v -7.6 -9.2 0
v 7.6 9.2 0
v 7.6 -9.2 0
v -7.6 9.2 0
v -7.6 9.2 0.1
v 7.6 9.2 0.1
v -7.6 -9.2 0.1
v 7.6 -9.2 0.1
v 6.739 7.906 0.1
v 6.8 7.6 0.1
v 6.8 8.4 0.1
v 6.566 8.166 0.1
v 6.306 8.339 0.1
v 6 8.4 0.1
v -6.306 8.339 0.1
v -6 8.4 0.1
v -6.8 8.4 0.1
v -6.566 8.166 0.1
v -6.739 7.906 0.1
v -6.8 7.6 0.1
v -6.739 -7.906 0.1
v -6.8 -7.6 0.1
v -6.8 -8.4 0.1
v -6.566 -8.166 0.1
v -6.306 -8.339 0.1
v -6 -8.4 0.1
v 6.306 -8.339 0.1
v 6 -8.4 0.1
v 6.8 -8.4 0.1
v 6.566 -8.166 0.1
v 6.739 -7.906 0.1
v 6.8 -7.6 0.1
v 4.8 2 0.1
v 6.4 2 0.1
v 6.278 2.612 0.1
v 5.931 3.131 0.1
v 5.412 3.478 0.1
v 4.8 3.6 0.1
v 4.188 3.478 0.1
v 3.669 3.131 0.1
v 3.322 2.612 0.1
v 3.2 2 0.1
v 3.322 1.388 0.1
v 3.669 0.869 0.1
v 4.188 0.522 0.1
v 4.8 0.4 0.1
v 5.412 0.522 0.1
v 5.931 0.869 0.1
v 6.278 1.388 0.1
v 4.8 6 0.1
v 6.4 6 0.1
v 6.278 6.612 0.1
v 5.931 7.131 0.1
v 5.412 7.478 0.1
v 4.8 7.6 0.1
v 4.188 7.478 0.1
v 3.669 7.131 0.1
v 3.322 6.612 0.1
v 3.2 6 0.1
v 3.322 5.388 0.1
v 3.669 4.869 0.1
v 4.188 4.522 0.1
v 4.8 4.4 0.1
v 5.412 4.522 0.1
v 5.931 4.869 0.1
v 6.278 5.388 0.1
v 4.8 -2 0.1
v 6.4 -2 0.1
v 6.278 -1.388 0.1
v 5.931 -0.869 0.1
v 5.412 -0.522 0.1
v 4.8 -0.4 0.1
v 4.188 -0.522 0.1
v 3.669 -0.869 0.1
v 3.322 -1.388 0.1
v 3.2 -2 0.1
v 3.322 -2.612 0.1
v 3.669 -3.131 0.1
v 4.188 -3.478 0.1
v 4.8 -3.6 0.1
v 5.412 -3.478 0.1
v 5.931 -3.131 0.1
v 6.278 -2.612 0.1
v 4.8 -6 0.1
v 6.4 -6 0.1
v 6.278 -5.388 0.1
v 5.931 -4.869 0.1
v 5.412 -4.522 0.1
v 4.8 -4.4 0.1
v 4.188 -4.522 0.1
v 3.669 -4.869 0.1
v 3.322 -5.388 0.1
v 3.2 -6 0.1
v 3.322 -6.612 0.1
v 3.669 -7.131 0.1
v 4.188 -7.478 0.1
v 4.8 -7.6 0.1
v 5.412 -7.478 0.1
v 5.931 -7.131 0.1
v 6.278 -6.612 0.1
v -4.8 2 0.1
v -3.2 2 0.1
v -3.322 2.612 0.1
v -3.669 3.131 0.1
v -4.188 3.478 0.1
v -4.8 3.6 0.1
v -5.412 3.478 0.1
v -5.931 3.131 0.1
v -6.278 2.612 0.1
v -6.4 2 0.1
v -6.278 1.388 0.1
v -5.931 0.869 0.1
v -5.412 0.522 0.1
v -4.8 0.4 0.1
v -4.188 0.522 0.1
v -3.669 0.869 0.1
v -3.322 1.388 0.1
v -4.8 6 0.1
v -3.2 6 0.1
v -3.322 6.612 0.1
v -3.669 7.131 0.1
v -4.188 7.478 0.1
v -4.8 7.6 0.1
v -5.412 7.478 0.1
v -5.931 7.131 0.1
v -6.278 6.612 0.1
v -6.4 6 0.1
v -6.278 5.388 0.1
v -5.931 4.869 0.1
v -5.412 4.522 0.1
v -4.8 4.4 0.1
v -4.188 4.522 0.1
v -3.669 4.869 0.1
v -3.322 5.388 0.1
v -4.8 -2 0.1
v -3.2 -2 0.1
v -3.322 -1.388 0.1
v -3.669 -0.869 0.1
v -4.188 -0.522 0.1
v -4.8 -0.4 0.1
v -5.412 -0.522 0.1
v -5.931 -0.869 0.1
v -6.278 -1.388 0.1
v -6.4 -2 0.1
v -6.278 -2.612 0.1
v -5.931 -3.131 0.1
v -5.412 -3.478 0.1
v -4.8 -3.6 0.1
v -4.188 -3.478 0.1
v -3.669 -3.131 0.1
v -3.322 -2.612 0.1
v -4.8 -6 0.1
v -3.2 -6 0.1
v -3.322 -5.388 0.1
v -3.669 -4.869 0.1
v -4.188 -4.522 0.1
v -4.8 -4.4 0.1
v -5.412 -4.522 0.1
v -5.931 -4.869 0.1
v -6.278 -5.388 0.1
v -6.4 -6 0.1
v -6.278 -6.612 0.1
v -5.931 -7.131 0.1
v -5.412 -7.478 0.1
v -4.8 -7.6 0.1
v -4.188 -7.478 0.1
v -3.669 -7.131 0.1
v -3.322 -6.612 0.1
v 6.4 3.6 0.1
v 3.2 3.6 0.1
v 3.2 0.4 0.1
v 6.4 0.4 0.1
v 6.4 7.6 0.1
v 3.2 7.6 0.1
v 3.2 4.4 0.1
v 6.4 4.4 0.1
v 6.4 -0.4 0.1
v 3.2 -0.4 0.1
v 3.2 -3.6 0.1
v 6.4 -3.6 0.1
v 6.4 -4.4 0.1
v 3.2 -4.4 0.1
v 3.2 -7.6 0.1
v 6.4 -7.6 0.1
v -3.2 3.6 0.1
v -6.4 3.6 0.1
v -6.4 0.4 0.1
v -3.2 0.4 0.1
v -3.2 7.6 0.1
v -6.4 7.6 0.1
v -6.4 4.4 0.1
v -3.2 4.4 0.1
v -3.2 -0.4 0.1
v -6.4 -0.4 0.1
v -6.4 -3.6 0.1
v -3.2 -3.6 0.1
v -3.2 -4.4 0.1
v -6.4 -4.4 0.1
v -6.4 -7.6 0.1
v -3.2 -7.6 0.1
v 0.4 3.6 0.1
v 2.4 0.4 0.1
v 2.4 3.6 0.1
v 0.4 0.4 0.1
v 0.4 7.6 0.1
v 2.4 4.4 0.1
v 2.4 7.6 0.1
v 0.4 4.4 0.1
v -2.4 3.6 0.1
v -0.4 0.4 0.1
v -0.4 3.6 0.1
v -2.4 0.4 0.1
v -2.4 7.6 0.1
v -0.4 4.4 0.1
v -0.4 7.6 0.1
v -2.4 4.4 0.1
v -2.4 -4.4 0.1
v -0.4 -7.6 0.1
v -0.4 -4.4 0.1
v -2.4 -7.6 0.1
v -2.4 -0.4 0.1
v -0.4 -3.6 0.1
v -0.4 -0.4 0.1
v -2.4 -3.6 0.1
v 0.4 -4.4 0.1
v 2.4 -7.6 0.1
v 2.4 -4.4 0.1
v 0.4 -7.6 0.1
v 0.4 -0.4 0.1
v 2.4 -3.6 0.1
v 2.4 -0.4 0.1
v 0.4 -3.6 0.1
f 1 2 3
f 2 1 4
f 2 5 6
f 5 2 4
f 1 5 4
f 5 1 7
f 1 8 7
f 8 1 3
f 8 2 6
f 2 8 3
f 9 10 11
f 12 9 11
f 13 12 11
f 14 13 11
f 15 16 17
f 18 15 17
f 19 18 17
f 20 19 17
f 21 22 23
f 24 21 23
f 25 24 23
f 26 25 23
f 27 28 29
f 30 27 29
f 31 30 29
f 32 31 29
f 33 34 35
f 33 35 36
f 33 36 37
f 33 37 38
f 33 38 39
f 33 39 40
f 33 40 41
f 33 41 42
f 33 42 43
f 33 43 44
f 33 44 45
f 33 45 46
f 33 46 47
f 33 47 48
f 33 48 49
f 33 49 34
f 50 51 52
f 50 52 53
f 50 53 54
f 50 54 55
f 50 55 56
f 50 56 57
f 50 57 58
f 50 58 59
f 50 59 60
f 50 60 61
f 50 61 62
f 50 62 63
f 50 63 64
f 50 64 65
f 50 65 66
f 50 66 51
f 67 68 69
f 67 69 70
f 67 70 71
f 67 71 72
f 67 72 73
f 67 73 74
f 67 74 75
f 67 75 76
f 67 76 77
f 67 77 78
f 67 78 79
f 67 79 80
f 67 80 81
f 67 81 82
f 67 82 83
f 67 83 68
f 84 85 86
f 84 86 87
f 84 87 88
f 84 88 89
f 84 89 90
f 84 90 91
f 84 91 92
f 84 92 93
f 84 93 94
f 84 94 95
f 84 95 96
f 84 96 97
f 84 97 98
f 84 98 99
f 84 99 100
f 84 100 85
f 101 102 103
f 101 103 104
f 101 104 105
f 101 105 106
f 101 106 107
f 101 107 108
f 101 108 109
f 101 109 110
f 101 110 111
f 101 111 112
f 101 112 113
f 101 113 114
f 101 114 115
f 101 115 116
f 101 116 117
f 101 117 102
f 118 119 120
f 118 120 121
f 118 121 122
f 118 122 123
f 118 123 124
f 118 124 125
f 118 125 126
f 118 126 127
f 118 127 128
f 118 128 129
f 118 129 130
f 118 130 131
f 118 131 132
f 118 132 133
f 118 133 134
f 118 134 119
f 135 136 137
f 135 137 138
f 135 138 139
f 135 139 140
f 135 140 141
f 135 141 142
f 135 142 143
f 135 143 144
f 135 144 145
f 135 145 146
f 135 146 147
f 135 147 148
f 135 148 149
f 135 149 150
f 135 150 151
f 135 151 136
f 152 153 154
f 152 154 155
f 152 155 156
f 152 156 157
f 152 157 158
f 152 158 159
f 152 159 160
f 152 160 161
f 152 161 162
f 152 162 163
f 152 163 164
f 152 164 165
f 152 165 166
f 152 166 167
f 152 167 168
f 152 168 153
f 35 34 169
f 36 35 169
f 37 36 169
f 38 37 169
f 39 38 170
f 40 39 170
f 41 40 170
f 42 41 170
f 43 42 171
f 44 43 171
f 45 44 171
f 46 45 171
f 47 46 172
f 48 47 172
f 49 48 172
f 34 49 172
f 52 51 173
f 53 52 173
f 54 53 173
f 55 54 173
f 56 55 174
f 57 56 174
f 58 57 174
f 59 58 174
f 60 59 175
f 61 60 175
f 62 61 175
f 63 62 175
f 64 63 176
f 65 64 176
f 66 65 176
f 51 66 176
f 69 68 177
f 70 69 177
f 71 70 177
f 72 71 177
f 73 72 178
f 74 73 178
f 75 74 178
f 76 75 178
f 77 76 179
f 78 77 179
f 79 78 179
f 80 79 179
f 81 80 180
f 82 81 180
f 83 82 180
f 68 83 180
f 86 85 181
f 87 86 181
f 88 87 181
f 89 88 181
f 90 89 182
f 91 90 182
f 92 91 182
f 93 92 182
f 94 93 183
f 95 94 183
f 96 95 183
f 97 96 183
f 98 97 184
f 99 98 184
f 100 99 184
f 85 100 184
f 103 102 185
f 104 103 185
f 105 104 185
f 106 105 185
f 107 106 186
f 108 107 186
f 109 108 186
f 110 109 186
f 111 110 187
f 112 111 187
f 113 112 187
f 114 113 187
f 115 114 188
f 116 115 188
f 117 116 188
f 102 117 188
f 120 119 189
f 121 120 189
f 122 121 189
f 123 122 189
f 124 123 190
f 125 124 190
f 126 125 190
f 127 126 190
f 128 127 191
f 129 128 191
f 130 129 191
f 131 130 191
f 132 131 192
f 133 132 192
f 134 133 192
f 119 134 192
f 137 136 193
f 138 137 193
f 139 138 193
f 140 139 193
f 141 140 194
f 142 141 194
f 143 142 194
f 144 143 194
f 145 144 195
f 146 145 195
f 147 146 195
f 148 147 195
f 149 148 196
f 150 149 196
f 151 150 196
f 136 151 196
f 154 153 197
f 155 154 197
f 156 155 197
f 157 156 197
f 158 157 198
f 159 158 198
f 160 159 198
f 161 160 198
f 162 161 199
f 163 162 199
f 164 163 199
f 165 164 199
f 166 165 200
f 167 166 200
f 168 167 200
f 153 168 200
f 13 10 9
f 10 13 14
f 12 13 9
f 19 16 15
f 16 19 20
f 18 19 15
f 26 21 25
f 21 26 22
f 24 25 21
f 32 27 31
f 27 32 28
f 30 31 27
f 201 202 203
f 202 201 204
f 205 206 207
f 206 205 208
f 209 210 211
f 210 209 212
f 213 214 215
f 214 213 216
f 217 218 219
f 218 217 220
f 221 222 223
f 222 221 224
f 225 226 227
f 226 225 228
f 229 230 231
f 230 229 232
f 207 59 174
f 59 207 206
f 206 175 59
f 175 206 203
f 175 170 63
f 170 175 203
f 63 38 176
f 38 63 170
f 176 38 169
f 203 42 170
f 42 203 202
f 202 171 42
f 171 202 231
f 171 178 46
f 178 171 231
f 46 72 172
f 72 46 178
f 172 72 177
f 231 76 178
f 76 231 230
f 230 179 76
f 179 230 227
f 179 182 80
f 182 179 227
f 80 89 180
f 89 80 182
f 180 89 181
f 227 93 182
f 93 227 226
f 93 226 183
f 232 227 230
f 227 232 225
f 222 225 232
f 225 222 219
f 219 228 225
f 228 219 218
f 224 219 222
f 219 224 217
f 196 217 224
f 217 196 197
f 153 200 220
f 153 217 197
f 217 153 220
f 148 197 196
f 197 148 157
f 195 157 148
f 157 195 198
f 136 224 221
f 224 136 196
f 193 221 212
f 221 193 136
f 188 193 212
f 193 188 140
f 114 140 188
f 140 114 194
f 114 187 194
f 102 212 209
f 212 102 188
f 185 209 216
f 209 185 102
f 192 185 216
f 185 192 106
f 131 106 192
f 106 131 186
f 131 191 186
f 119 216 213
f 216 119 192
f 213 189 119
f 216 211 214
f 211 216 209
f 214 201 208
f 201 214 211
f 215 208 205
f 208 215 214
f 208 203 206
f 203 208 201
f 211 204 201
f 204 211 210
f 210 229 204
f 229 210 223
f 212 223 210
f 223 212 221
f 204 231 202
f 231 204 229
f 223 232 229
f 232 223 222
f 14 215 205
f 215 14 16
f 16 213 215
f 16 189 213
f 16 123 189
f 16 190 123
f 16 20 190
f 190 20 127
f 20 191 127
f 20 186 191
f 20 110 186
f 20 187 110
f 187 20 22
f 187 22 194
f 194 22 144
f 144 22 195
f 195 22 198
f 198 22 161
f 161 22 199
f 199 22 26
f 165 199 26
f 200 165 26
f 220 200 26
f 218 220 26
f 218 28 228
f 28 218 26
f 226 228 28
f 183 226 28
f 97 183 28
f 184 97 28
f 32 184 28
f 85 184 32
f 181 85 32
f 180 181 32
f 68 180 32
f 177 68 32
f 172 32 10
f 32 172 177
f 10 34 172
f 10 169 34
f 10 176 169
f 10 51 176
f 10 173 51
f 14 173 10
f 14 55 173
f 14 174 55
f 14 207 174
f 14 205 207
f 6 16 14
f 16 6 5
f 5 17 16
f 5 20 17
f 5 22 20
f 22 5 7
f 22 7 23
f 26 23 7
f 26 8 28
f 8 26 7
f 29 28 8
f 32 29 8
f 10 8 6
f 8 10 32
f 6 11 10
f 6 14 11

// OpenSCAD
// file: ../p/box5-12.scad
use <../lib.scad>
function ldraw_lib__box5_12() = [
// 0 Box with 5 Faces without Any Edges
// 0 Name: box5-12.dat
// 0 Author: Chris Dee [cwdee]
// 0 !LDRAW_ORG Primitive UPDATE 2009-02
// 0 !LICENSE Licensed under CC BY 4.0 : see CAreadme.txt
// 
// 0 BFC CERTIFY CCW
  [0,"BFC","CERTIFY"],
  [0,"BFC","CCW"],
// 
// 0 !HISTORY 2009-09-03 [PTadmin] Official Update 2009-02
// 
// 
// 4 16 1 1 1 1 1 -1 -1 1 -1 -1 1 1
  [4,16,1,1,1,1,1,-1,-1,1,-1,-1,1,1],
// 4 16 -1 0 1 1 0 1 1 1 1 -1 1 1
  [4,16,-1,0,1,1,0,1,1,1,1,-1,1,1],
// 4 16 -1 0 -1 -1 0 1 -1 1 1 -1 1 -1
  [4,16,-1,0,-1,-1,0,1,-1,1,1,-1,1,-1],
// 4 16 1 0 -1 -1 0 -1 -1 1 -1 1 1 -1
  [4,16,1,0,-1,-1,0,-1,-1,1,-1,1,1,-1],
// 4 16 1 0 1 1 0 -1 1 1 -1 1 1 1
  [4,16,1,0,1,1,0,-1,1,1,-1,1,1,1],
// 0
];
module ldraw_lib__box5_12(step=0, col=false, unit=2/5, alt=false, line=0.2, solid=!$preview)
    makepoly(ldraw_lib__box5_12(), step=step, col=col, unit=unit, alt=alt, line=line, solid=solid);
ldraw_lib__box5_12(line=0.2);
// file: ../p/4-4ndis.scad
use <../lib.scad>
function ldraw_lib__4_4ndis() = [
// 0 Disc Negative 1.0
// 0 Name: 4-4ndis.dat
// 0 Author: James Jessiman
// 0 !LDRAW_ORG Primitive UPDATE 2012-01
// 0 !LICENSE Licensed under CC BY 4.0 : see CAreadme.txt
// 
// 0 BFC CERTIFY CCW
  [0,"BFC","CERTIFY"],
  [0,"BFC","CCW"],
// 
// 0 !HISTORY 2002-03-23 [sbliss] Added BFC statement; compacted code
// 0 !HISTORY 2002-04-25 [PTadmin] Official Update 2002-02
// 0 !HISTORY 2007-06-24 [PTadmin] Header formatted for Contributor Agreement
// 0 !HISTORY 2008-07-01 [PTadmin] Official Update 2008-01
// 0 !HISTORY 2012-02-16 [Philo] Changed to CCW
// 0 !HISTORY 2012-03-30 [PTadmin] Official Update 2012-01
// 
// 
// 3 16 0.9239 0 0.3827 1 0 0 1 0 1
  [3,16,0.9239,0,0.3827,1,0,0,1,0,1],
// 3 16 0.7071 0 0.7071 0.9239 0 0.3827 1 0 1
  [3,16,0.7071,0,0.7071,0.9239,0,0.3827,1,0,1],
// 3 16 0.3827 0 0.9239 0.7071 0 0.7071 1 0 1
  [3,16,0.3827,0,0.9239,0.7071,0,0.7071,1,0,1],
// 3 16 0 0 1 0.3827 0 0.9239 1 0 1
  [3,16,0,0,1,0.3827,0,0.9239,1,0,1],
// 3 16 -0.3827 0 0.9239 0 0 1 -1 0 1
  [3,16,-0.3827,0,0.9239,0,0,1,-1,0,1],
// 3 16 -0.7071 0 0.7071 -0.3827 0 0.9239 -1 0 1
  [3,16,-0.7071,0,0.7071,-0.3827,0,0.9239,-1,0,1],
// 3 16 -0.9239 0 0.3827 -0.7071 0 0.7071 -1 0 1
  [3,16,-0.9239,0,0.3827,-0.7071,0,0.7071,-1,0,1],
// 3 16 -1 0 0 -0.9239 0 0.3827 -1 0 1
  [3,16,-1,0,0,-0.9239,0,0.3827,-1,0,1],
// 3 16 -0.9239 0 -0.3827 -1 0 0 -1 0 -1
  [3,16,-0.9239,0,-0.3827,-1,0,0,-1,0,-1],
// 3 16 -0.7071 0 -0.7071 -0.9239 0 -0.3827 -1 0 -1
  [3,16,-0.7071,0,-0.7071,-0.9239,0,-0.3827,-1,0,-1],
// 3 16 -0.3827 0 -0.9239 -0.7071 0 -0.7071 -1 0 -1
  [3,16,-0.3827,0,-0.9239,-0.7071,0,-0.7071,-1,0,-1],
// 3 16 0 0 -1 -0.3827 0 -0.9239 -1 0 -1
  [3,16,0,0,-1,-0.3827,0,-0.9239,-1,0,-1],
// 3 16 0.3827 0 -0.9239 0 0 -1 1 0 -1
  [3,16,0.3827,0,-0.9239,0,0,-1,1,0,-1],
// 3 16 0.7071 0 -0.7071 0.3827 0 -0.9239 1 0 -1
  [3,16,0.7071,0,-0.7071,0.3827,0,-0.9239,1,0,-1],
// 3 16 0.9239 0 -0.3827 0.7071 0 -0.7071 1 0 -1
  [3,16,0.9239,0,-0.3827,0.7071,0,-0.7071,1,0,-1],
// 3 16 1 0 0 0.9239 0 -0.3827 1 0 -1
  [3,16,1,0,0,0.9239,0,-0.3827,1,0,-1],
];
module ldraw_lib__4_4ndis(step=0, col=false, unit=2/5, alt=false, line=0.2, solid=!$preview)
    makepoly(ldraw_lib__4_4ndis(), step=step, col=col, unit=unit, alt=alt, line=line, solid=solid);
ldraw_lib__4_4ndis(line=0.2);
// file: ../p/4-4disc.scad
use <../lib.scad>
function ldraw_lib__4_4disc() = [
// 0 Disc 1.0
// 0 Name: 4-4disc.dat
// 0 Author: James Jessiman
// 0 !LDRAW_ORG Primitive UPDATE 2002-02
// 0 !LICENSE Licensed under CC BY 4.0 : see CAreadme.txt
// 
// 0 BFC CERTIFY CCW
  [0,"BFC","CERTIFY"],
  [0,"BFC","CCW"],
// 
// 0 !HISTORY 1998-12-15 [PTadmin] Official Update 1998-10
// 0 !HISTORY 2002-03-23 [sbliss] Added BFC statement
// 0 !HISTORY 2002-04-25 [PTadmin] Official Update 2002-02
// 0 !HISTORY 2007-06-24 [PTadmin] Header formatted for Contributor Agreement
// 0 !HISTORY 2008-07-01 [PTadmin] Official Update 2008-01
// 
// 
// 3 16 0 0 0 1 0 0 0.9239 0 0.3827
  [3,16,0,0,0,1,0,0,0.9239,0,0.3827],
// 3 16 0 0 0 0.9239 0 0.3827 0.7071 0 0.7071
  [3,16,0,0,0,0.9239,0,0.3827,0.7071,0,0.7071],
// 3 16 0 0 0 0.7071 0 0.7071 0.3827 0 0.9239
  [3,16,0,0,0,0.7071,0,0.7071,0.3827,0,0.9239],
// 3 16 0 0 0 0.3827 0 0.9239 0 0 1
  [3,16,0,0,0,0.3827,0,0.9239,0,0,1],
// 3 16 0 0 0 0 0 1 -0.3827 0 0.9239
  [3,16,0,0,0,0,0,1,-0.3827,0,0.9239],
// 3 16 0 0 0 -0.3827 0 0.9239 -0.7071 0 0.7071
  [3,16,0,0,0,-0.3827,0,0.9239,-0.7071,0,0.7071],
// 3 16 0 0 0 -0.7071 0 0.7071 -0.9239 0 0.3827
  [3,16,0,0,0,-0.7071,0,0.7071,-0.9239,0,0.3827],
// 3 16 0 0 0 -0.9239 0 0.3827 -1 0 -0
  [3,16,0,0,0,-0.9239,0,0.3827,-1,0,-0],
// 3 16 0 0 0 -1 0 -0 -0.9239 0 -0.3827
  [3,16,0,0,0,-1,0,-0,-0.9239,0,-0.3827],
// 3 16 0 0 0 -0.9239 0 -0.3827 -0.7071 0 -0.7071
  [3,16,0,0,0,-0.9239,0,-0.3827,-0.7071,0,-0.7071],
// 3 16 0 0 0 -0.7071 0 -0.7071 -0.3827 0 -0.9239
  [3,16,0,0,0,-0.7071,0,-0.7071,-0.3827,0,-0.9239],
// 3 16 0 0 0 -0.3827 0 -0.9239 0 0 -1
  [3,16,0,0,0,-0.3827,0,-0.9239,0,0,-1],
// 3 16 0 0 0 0 0 -1 0.3827 0 -0.9239
  [3,16,0,0,0,0,0,-1,0.3827,0,-0.9239],
// 3 16 0 0 0 0.3827 0 -0.9239 0.7071 0 -0.7071
  [3,16,0,0,0,0.3827,0,-0.9239,0.7071,0,-0.7071],
// 3 16 0 0 0 0.7071 0 -0.7071 0.9239 0 -0.3827
  [3,16,0,0,0,0.7071,0,-0.7071,0.9239,0,-0.3827],
// 3 16 0 0 0 0.9239 0 -0.3827 1 0 0
  [3,16,0,0,0,0.9239,0,-0.3827,1,0,0],
// 0
];
module ldraw_lib__4_4disc(step=0, col=false, unit=2/5, alt=false, line=0.2, solid=!$preview)
    makepoly(ldraw_lib__4_4disc(), step=step, col=col, unit=unit, alt=alt, line=line, solid=solid);
ldraw_lib__4_4disc(line=0.2);
// file: ../p/1-4ndis.scad
use <../lib.scad>
function ldraw_lib__1_4ndis() = [
// 0 Disc Negative 0.25
// 0 Name: 1-4ndis.dat
// 0 Author: James Jessiman
// 0 !LDRAW_ORG Primitive UPDATE 2012-01
// 0 !LICENSE Licensed under CC BY 4.0 : see CAreadme.txt
// 
// 0 BFC CERTIFY CCW
  [0,"BFC","CERTIFY"],
  [0,"BFC","CCW"],
// 
// 0 !HISTORY 2002-03-23 [sbliss] Added BFC Statement
// 0 !HISTORY 2002-04-25 [PTadmin] Official Update 2002-02
// 0 !HISTORY 2007-06-22 [PTadmin] Header formatted for Contributor Agreement
// 0 !HISTORY 2008-07-01 [PTadmin] Official Update 2008-01
// 0 !HISTORY 2012-02-16 [Philo] Changed to CCW
// 0 !HISTORY 2012-03-30 [PTadmin] Official Update 2012-01
// 
// 
// 3 16 0.9239 0 0.3827 1 0 0 1 0 1
  [3,16,0.9239,0,0.3827,1,0,0,1,0,1],
// 3 16 0.7071 0 0.7071 0.9239 0 0.3827 1 0 1
  [3,16,0.7071,0,0.7071,0.9239,0,0.3827,1,0,1],
// 3 16 0.3827 0 0.9239 0.7071 0 0.7071 1 0 1
  [3,16,0.3827,0,0.9239,0.7071,0,0.7071,1,0,1],
// 3 16 0 0 1 0.3827 0 0.9239 1 0 1
  [3,16,0,0,1,0.3827,0,0.9239,1,0,1],
];
module ldraw_lib__1_4ndis(step=0, col=false, unit=2/5, alt=false, line=0.2, solid=!$preview)
    makepoly(ldraw_lib__1_4ndis(), step=step, col=col, unit=unit, alt=alt, line=line, solid=solid);
ldraw_lib__1_4ndis(line=0.2);
// file: ../p/1-4chrd.scad
use <../lib.scad>
function ldraw_lib__1_4chrd() = [
// 0 Chord 0.25
// 0 Name: 1-4chrd.dat
// 0 Author: Max Martin Richter [MMR1988]
// 0 !LDRAW_ORG Primitive UPDATE 2023-05
// 0 !LICENSE Licensed under CC BY 4.0 : see CAreadme.txt
// 
// 0 BFC CERTIFY CCW
  [0,"BFC","CERTIFY"],
  [0,"BFC","CCW"],
// 
// 0 !HISTORY 2004-04-22 [PTadmin] Official Update 2004-02
// 0 !HISTORY 2007-10-09 [PTadmin] Header formatted for Contributor Agreement
// 0 !HISTORY 2008-07-01 [PTadmin] Official Update 2008-01
// 0 !HISTORY 2012-08-02 [MMR1988] Re-creation with PrimGen2 and Rectifier
// 0 !HISTORY 2012-08-09 [PTadmin] Official Update 2012-02
// 0 !HISTORY 2023-10-27 [OrionP] Change author to MMR1988 from hafhead
// 0 !HISTORY 2023-10-31 [OrionP] Official Update 2023-05
// 
// 4 16 0.9239 0 0.3827 0.3827 0 0.9239 0 0 1 1 0 0
  [4,16,0.9239,0,0.3827,0.3827,0,0.9239,0,0,1,1,0,0],
// 3 16 0.7071 0 0.7071 0.3827 0 0.9239 0.9239 0 0.3827
  [3,16,0.7071,0,0.7071,0.3827,0,0.9239,0.9239,0,0.3827],
];
module ldraw_lib__1_4chrd(step=0, col=false, unit=2/5, alt=false, line=0.2, solid=!$preview)
    makepoly(ldraw_lib__1_4chrd(), step=step, col=col, unit=unit, alt=alt, line=line, solid=solid);
ldraw_lib__1_4chrd(line=0.2);
// main file
use <../lib.scad>
use <../p/1-4chrd.scad>
use <../p/1-4ndis.scad>
use <../p/4-4disc.scad>
use <../p/4-4ndis.scad>
use <../p/box5-12.scad>
function ldraw_lib__196695b() = [
// 0 Sticker  2.3 x  1.9 with Four Red Circles, Eight White Rectangles and Four Yellow Circles
// 0 Name: 196695b.dat
// 0 Author: Takeshi Takahashi [RainbowDolphin]
// 0 !LDRAW_ORG Part UPDATE 2024-01
// 0 !LICENSE Licensed under CC BY 4.0 : see CAreadme.txt
// 
// 0 BFC CERTIFY CCW
  [0,"BFC","CERTIFY"],
  [0,"BFC","CCW"],
// 
// 0 !KEYWORDS Bricklink 6385stk01, Brickowl 514321, control panel, Fire engine
// 0 !KEYWORDS Fire Station, Rebrickable 196695, Set 6385
// 
// 0 !HISTORY 2024-01-29 [OrionP] Official Update 2024-01
// 
// 
// 1 16 0 -0.25 0 19 0 0 0 0.25 0 0 0 23 box5-12.dat
  [1,16,0,-0.25,0,19,0,0,0,0.25,0,0,0,23, ldraw_lib__box5_12()],
// 1 16 15 -0.25 19 2 0 0 0 1 0 0 0 2 1-4ndis.dat
  [1,16,15,-0.25,19,2,0,0,0,1,0,0,0,2, ldraw_lib__1_4ndis()],
// 1 16 -15 -0.25 19 0 0 -2 0 1 0 2 0 0 1-4ndis.dat
  [1,16,-15,-0.25,19,0,0,-2,0,1,0,2,0,0, ldraw_lib__1_4ndis()],
// 1 16 -15 -0.25 -19 -2 0 0 0 1 0 0 0 -2 1-4ndis.dat
  [1,16,-15,-0.25,-19,-2,0,0,0,1,0,0,0,-2, ldraw_lib__1_4ndis()],
// 1 16 15 -0.25 -19 0 0 2 0 1 0 -2 0 0 1-4ndis.dat
  [1,16,15,-0.25,-19,0,0,2,0,1,0,-2,0,0, ldraw_lib__1_4ndis()],
// 0 BFC NOCLIP
  [0,"BFC","NOCLIP"],
// 1 4 12 -0.25 5 4 0 0 0 1 0 0 0 4 4-4disc.dat
  [1,4,12,-0.25,5,4,0,0,0,1,0,0,0,4, ldraw_lib__4_4disc()],
// 1 4 12 -0.25 15 4 0 0 0 1 0 0 0 4 4-4disc.dat
  [1,4,12,-0.25,15,4,0,0,0,1,0,0,0,4, ldraw_lib__4_4disc()],
// 1 4 12 -0.25 -5 4 0 0 0 1 0 0 0 4 4-4disc.dat
  [1,4,12,-0.25,-5,4,0,0,0,1,0,0,0,4, ldraw_lib__4_4disc()],
// 1 4 12 -0.25 -15 4 0 0 0 1 0 0 0 4 4-4disc.dat
  [1,4,12,-0.25,-15,4,0,0,0,1,0,0,0,4, ldraw_lib__4_4disc()],
// 1 14 -12 -0.25 5 4 0 0 0 1 0 0 0 4 4-4disc.dat
  [1,14,-12,-0.25,5,4,0,0,0,1,0,0,0,4, ldraw_lib__4_4disc()],
// 1 14 -12 -0.25 15 4 0 0 0 1 0 0 0 4 4-4disc.dat
  [1,14,-12,-0.25,15,4,0,0,0,1,0,0,0,4, ldraw_lib__4_4disc()],
// 1 14 -12 -0.25 -5 4 0 0 0 1 0 0 0 4 4-4disc.dat
  [1,14,-12,-0.25,-5,4,0,0,0,1,0,0,0,4, ldraw_lib__4_4disc()],
// 1 14 -12 -0.25 -15 4 0 0 0 1 0 0 0 4 4-4disc.dat
  [1,14,-12,-0.25,-15,4,0,0,0,1,0,0,0,4, ldraw_lib__4_4disc()],
// 1 0 12 -0.25 5 4 0 0 0 1 0 0 0 4 4-4ndis.dat
  [1,0,12,-0.25,5,4,0,0,0,1,0,0,0,4, ldraw_lib__4_4ndis()],
// 1 0 12 -0.25 15 4 0 0 0 1 0 0 0 4 4-4ndis.dat
  [1,0,12,-0.25,15,4,0,0,0,1,0,0,0,4, ldraw_lib__4_4ndis()],
// 1 0 12 -0.25 -5 4 0 0 0 1 0 0 0 4 4-4ndis.dat
  [1,0,12,-0.25,-5,4,0,0,0,1,0,0,0,4, ldraw_lib__4_4ndis()],
// 1 0 12 -0.25 -15 4 0 0 0 1 0 0 0 4 4-4ndis.dat
  [1,0,12,-0.25,-15,4,0,0,0,1,0,0,0,4, ldraw_lib__4_4ndis()],
// 1 0 -12 -0.25 5 4 0 0 0 1 0 0 0 4 4-4ndis.dat
  [1,0,-12,-0.25,5,4,0,0,0,1,0,0,0,4, ldraw_lib__4_4ndis()],
// 1 0 -12 -0.25 15 4 0 0 0 1 0 0 0 4 4-4ndis.dat
  [1,0,-12,-0.25,15,4,0,0,0,1,0,0,0,4, ldraw_lib__4_4ndis()],
// 1 0 -12 -0.25 -5 4 0 0 0 1 0 0 0 4 4-4ndis.dat
  [1,0,-12,-0.25,-5,4,0,0,0,1,0,0,0,4, ldraw_lib__4_4ndis()],
// 1 0 -12 -0.25 -15 4 0 0 0 1 0 0 0 4 4-4ndis.dat
  [1,0,-12,-0.25,-15,4,0,0,0,1,0,0,0,4, ldraw_lib__4_4ndis()],
// 1 0 15 -0.25 19 2 0 0 0 1 0 0 0 2 1-4chrd.dat
  [1,0,15,-0.25,19,2,0,0,0,1,0,0,0,2, ldraw_lib__1_4chrd()],
// 1 0 -15 -0.25 19 0 0 -2 0 1 0 2 0 0 1-4chrd.dat
  [1,0,-15,-0.25,19,0,0,-2,0,1,0,2,0,0, ldraw_lib__1_4chrd()],
// 1 0 -15 -0.25 -19 -2 0 0 0 1 0 0 0 -2 1-4chrd.dat
  [1,0,-15,-0.25,-19,-2,0,0,0,1,0,0,0,-2, ldraw_lib__1_4chrd()],
// 1 0 15 -0.25 -19 0 0 2 0 1 0 -2 0 0 1-4chrd.dat
  [1,0,15,-0.25,-19,0,0,2,0,1,0,-2,0,0, ldraw_lib__1_4chrd()],
// 4 15 1 -0.25 9 1 -0.25 1 6 -0.25 1 6 -0.25 9
  [4,15,1,-0.25,9,1,-0.25,1,6,-0.25,1,6,-0.25,9],
// 4 15 1 -0.25 19 1 -0.25 11 6 -0.25 11 6 -0.25 19
  [4,15,1,-0.25,19,1,-0.25,11,6,-0.25,11,6,-0.25,19],
// 4 15 -6 -0.25 9 -6 -0.25 1 -1 -0.25 1 -1 -0.25 9
  [4,15,-6,-0.25,9,-6,-0.25,1,-1,-0.25,1,-1,-0.25,9],
// 4 15 -6 -0.25 19 -6 -0.25 11 -1 -0.25 11 -1 -0.25 19
  [4,15,-6,-0.25,19,-6,-0.25,11,-1,-0.25,11,-1,-0.25,19],
// 4 15 -6 -0.25 -11 -6 -0.25 -19 -1 -0.25 -19 -1 -0.25 -11
  [4,15,-6,-0.25,-11,-6,-0.25,-19,-1,-0.25,-19,-1,-0.25,-11],
// 4 15 -6 -0.25 -1 -6 -0.25 -9 -1 -0.25 -9 -1 -0.25 -1
  [4,15,-6,-0.25,-1,-6,-0.25,-9,-1,-0.25,-9,-1,-0.25,-1],
// 4 15 1 -0.25 -11 1 -0.25 -19 6 -0.25 -19 6 -0.25 -11
  [4,15,1,-0.25,-11,1,-0.25,-19,6,-0.25,-19,6,-0.25,-11],
// 4 15 1 -0.25 -1 1 -0.25 -9 6 -0.25 -9 6 -0.25 -1
  [4,15,1,-0.25,-1,1,-0.25,-9,6,-0.25,-9,6,-0.25,-1],
// 4 0 8 -0.25 15 8 -0.25 19 6 -0.25 19 6 -0.25 11
  [4,0,8,-0.25,15,8,-0.25,19,6,-0.25,19,6,-0.25,11],
// 4 0 8 -0.25 11 8 -0.25 15 6 -0.25 11 6 -0.25 9
  [4,0,8,-0.25,11,8,-0.25,15,6,-0.25,11,6,-0.25,9],
// 4 0 8 -0.25 11 6 -0.25 9 8 -0.25 9 12 -0.25 11
  [4,0,8,-0.25,11,6,-0.25,9,8,-0.25,9,12,-0.25,11],
// 4 0 12 -0.25 11 8 -0.25 9 12 -0.25 9 16 -0.25 11
  [4,0,12,-0.25,11,8,-0.25,9,12,-0.25,9,16,-0.25,11],
// 3 0 16 -0.25 11 12 -0.25 9 16 -0.25 9
  [3,0,16,-0.25,11,12,-0.25,9,16,-0.25,9],
// 4 0 8 -0.25 5 8 -0.25 9 6 -0.25 9 6 -0.25 1
  [4,0,8,-0.25,5,8,-0.25,9,6,-0.25,9,6,-0.25,1],
// 4 0 8 -0.25 1 8 -0.25 5 6 -0.25 1 6 -0.25 -1
  [4,0,8,-0.25,1,8,-0.25,5,6,-0.25,1,6,-0.25,-1],
// 4 0 8 -0.25 1 6 -0.25 -1 8 -0.25 -1 12 -0.25 1
  [4,0,8,-0.25,1,6,-0.25,-1,8,-0.25,-1,12,-0.25,1],
// 4 0 12 -0.25 1 8 -0.25 -1 12 -0.25 -1 16 -0.25 1
  [4,0,12,-0.25,1,8,-0.25,-1,12,-0.25,-1,16,-0.25,1],
// 3 0 16 -0.25 1 12 -0.25 -1 16 -0.25 -1
  [3,0,16,-0.25,1,12,-0.25,-1,16,-0.25,-1],
// 4 0 8 -0.25 -5 8 -0.25 -1 6 -0.25 -1 6 -0.25 -9
  [4,0,8,-0.25,-5,8,-0.25,-1,6,-0.25,-1,6,-0.25,-9],
// 4 0 8 -0.25 -9 8 -0.25 -5 6 -0.25 -9 6 -0.25 -11
  [4,0,8,-0.25,-9,8,-0.25,-5,6,-0.25,-9,6,-0.25,-11],
// 4 0 8 -0.25 -9 6 -0.25 -11 8 -0.25 -11 12 -0.25 -9
  [4,0,8,-0.25,-9,6,-0.25,-11,8,-0.25,-11,12,-0.25,-9],
// 4 0 12 -0.25 -9 8 -0.25 -11 12 -0.25 -11 16 -0.25 -9
  [4,0,12,-0.25,-9,8,-0.25,-11,12,-0.25,-11,16,-0.25,-9],
// 3 0 16 -0.25 -9 12 -0.25 -11 16 -0.25 -11
  [3,0,16,-0.25,-9,12,-0.25,-11,16,-0.25,-11],
// 4 0 8 -0.25 -15 8 -0.25 -11 6 -0.25 -11 6 -0.25 -19
  [4,0,8,-0.25,-15,8,-0.25,-11,6,-0.25,-11,6,-0.25,-19],
// 3 0 8 -0.25 -15 6 -0.25 -19 8 -0.25 -19
  [3,0,8,-0.25,-15,6,-0.25,-19,8,-0.25,-19],
// 4 0 6 -0.25 -11 6 -0.25 -9 1 -0.25 -9 1 -0.25 -11
  [4,0,6,-0.25,-11,6,-0.25,-9,1,-0.25,-9,1,-0.25,-11],
// 4 0 -1 -0.25 -11 1 -0.25 -11 1 -0.25 -9 -1 -0.25 -9
  [4,0,-1,-0.25,-11,1,-0.25,-11,1,-0.25,-9,-1,-0.25,-9],
// 4 0 1 -0.25 -19 1 -0.25 -11 -1 -0.25 -11 -1 -0.25 -19
  [4,0,1,-0.25,-19,1,-0.25,-11,-1,-0.25,-11,-1,-0.25,-19],
// 4 0 -1 -0.25 -11 -1 -0.25 -9 -6 -0.25 -9 -6 -0.25 -11
  [4,0,-1,-0.25,-11,-1,-0.25,-9,-6,-0.25,-9,-6,-0.25,-11],
// 4 0 -8 -0.25 -11 -6 -0.25 -11 -6 -0.25 -9 -8 -0.25 -9
  [4,0,-8,-0.25,-11,-6,-0.25,-11,-6,-0.25,-9,-8,-0.25,-9],
// 3 0 -8 -.25 -15 -8 -.25 -19 -6 -.25 -19
  [3,0,-8,-.25,-15,-8,-.25,-19,-6,-.25,-19],
// 4 0 -6 -.25 -19 -6 -.25 -11 -8 -.25 -11 -8 -.25 -15
  [4,0,-6,-.25,-19,-6,-.25,-11,-8,-.25,-11,-8,-.25,-15],
// 4 0 -12 -0.25 -11 -8 -0.25 -11 -8 -0.25 -9 -12 -0.25 -9
  [4,0,-12,-0.25,-11,-8,-0.25,-11,-8,-0.25,-9,-12,-0.25,-9],
// 4 0 -16 -0.25 -11 -12 -0.25 -11 -12 -0.25 -9 -16 -0.25 -9
  [4,0,-16,-0.25,-11,-12,-0.25,-11,-12,-0.25,-9,-16,-0.25,-9],
// 4 0 -8 -0.25 -5 -8 -0.25 -9 -6 -0.25 -9 -6 -0.25 -1
  [4,0,-8,-0.25,-5,-8,-0.25,-9,-6,-0.25,-9,-6,-0.25,-1],
// 4 0 -8 -0.25 -1 -8 -0.25 -5 -6 -0.25 -1 -6 -0.25 1
  [4,0,-8,-0.25,-1,-8,-0.25,-5,-6,-0.25,-1,-6,-0.25,1],
// 4 0 -8 -0.25 -1 -6 -0.25 1 -8 -0.25 1 -12 -0.25 -1
  [4,0,-8,-0.25,-1,-6,-0.25,1,-8,-0.25,1,-12,-0.25,-1],
// 4 0 -12 -0.25 -1 -8 -0.25 1 -12 -0.25 1 -16 -0.25 -1
  [4,0,-12,-0.25,-1,-8,-0.25,1,-12,-0.25,1,-16,-0.25,-1],
// 3 0 -12 -0.25 1 -16 -0.25 1 -16 -0.25 -1
  [3,0,-12,-0.25,1,-16,-0.25,1,-16,-0.25,-1],
// 4 0 -8 -0.25 5 -8 -0.25 1 -6 -0.25 1 -6 -0.25 9
  [4,0,-8,-0.25,5,-8,-0.25,1,-6,-0.25,1,-6,-0.25,9],
// 4 0 -8 -0.25 9 -8 -0.25 5 -6 -0.25 9 -6 -0.25 11
  [4,0,-8,-0.25,9,-8,-0.25,5,-6,-0.25,9,-6,-0.25,11],
// 4 0 -8 -0.25 9 -6 -0.25 11 -8 -0.25 11 -12 -0.25 9
  [4,0,-8,-0.25,9,-6,-0.25,11,-8,-0.25,11,-12,-0.25,9],
// 4 0 -12 -0.25 9 -8 -0.25 11 -12 -0.25 11 -16 -0.25 9
  [4,0,-12,-0.25,9,-8,-0.25,11,-12,-0.25,11,-16,-0.25,9],
// 3 0 -12 -0.25 11 -16 -0.25 11 -16 -0.25 9
  [3,0,-12,-0.25,11,-16,-0.25,11,-16,-0.25,9],
// 4 0 -8 -0.25 15 -8 -0.25 11 -6 -0.25 11 -6 -0.25 19
  [4,0,-8,-0.25,15,-8,-0.25,11,-6,-0.25,11,-6,-0.25,19],
// 3 0 -6 -0.25 19 -8 -0.25 19 -8 -0.25 15
  [3,0,-6,-0.25,19,-8,-0.25,19,-8,-0.25,15],
// 4 0 -6 -0.25 11 -6 -0.25 9 -1 -0.25 9 -1 -0.25 11
  [4,0,-6,-0.25,11,-6,-0.25,9,-1,-0.25,9,-1,-0.25,11],
// 4 0 1 -0.25 11 -1 -0.25 11 -1 -0.25 9 1 -0.25 9
  [4,0,1,-0.25,11,-1,-0.25,11,-1,-0.25,9,1,-0.25,9],
// 4 0 -1 -0.25 19 -1 -0.25 11 1 -0.25 11 1 -0.25 19
  [4,0,-1,-0.25,19,-1,-0.25,11,1,-0.25,11,1,-0.25,19],
// 4 0 1 -0.25 11 1 -0.25 9 6 -0.25 9 6 -0.25 11
  [4,0,1,-0.25,11,1,-0.25,9,6,-0.25,9,6,-0.25,11],
// 4 0 1 -0.25 1 1 -0.25 9 -1 -0.25 9 -1 -0.25 1
  [4,0,1,-0.25,1,1,-0.25,9,-1,-0.25,9,-1,-0.25,1],
// 4 0 1 -0.25 -1 1 -0.25 1 -1 -0.25 1 -1 -0.25 -1
  [4,0,1,-0.25,-1,1,-0.25,1,-1,-0.25,1,-1,-0.25,-1],
// 4 0 -1 -0.25 -1 -1 -0.25 1 -6 -0.25 1 -6 -0.25 -1
  [4,0,-1,-0.25,-1,-1,-0.25,1,-6,-0.25,1,-6,-0.25,-1],
// 4 0 1 -0.25 1 1 -0.25 -1 6 -0.25 -1 6 -0.25 1
  [4,0,1,-0.25,1,1,-0.25,-1,6,-0.25,-1,6,-0.25,1],
// 4 0 1 -0.25 -9 1 -0.25 -1 -1 -0.25 -1 -1 -0.25 -9
  [4,0,1,-0.25,-9,1,-0.25,-1,-1,-0.25,-1,-1,-0.25,-9],
// 4 0 1 -0.25 19 15 -0.25 21 -15 -0.25 21 -1 -0.25 19
  [4,0,1,-0.25,19,15,-0.25,21,-15,-0.25,21,-1,-0.25,19],
// 3 0 -15 -0.25 21 -6 -0.25 19 -1 -0.25 19
  [3,0,-15,-0.25,21,-6,-0.25,19,-1,-0.25,19],
// 3 0 -15 -0.25 21 -8 -0.25 19 -6 -0.25 19
  [3,0,-15,-0.25,21,-8,-0.25,19,-6,-0.25,19],
// 3 0 -15 -0.25 21 -12 -0.25 19 -8 -0.25 19
  [3,0,-15,-0.25,21,-12,-0.25,19,-8,-0.25,19],
// 3 0 -15 -0.25 21 -16 -0.25 19 -12 -0.25 19
  [3,0,-15,-0.25,21,-16,-0.25,19,-12,-0.25,19],
// 3 0 -15 -0.25 21 -17 -0.25 19 -16 -0.25 19
  [3,0,-15,-0.25,21,-17,-0.25,19,-16,-0.25,19],
// 3 0 -16 -0.25 19 -17 -0.25 19 -16 -0.25 15
  [3,0,-16,-0.25,19,-17,-0.25,19,-16,-0.25,15],
// 3 0 -17 -0.25 19 -16 -0.25 11 -16 -0.25 15
  [3,0,-17,-0.25,19,-16,-0.25,11,-16,-0.25,15],
// 3 0 -17 -0.25 19 -16 -0.25 9 -16 -0.25 11
  [3,0,-17,-0.25,19,-16,-0.25,9,-16,-0.25,11],
// 3 0 -17 -0.25 19 -16 -0.25 5 -16 -0.25 9
  [3,0,-17,-0.25,19,-16,-0.25,5,-16,-0.25,9],
// 4 0 -16 -0.25 1 -16 -0.25 5 -17 -0.25 19 -17 -0.25 -19
  [4,0,-16,-0.25,1,-16,-0.25,5,-17,-0.25,19,-17,-0.25,-19],
// 3 0 -16 -0.25 1 -17 -0.25 -19 -16 -0.25 -1
  [3,0,-16,-0.25,1,-17,-0.25,-19,-16,-0.25,-1],
// 3 0 -16 -0.25 -1 -17 -0.25 -19 -16 -0.25 -5
  [3,0,-16,-0.25,-1,-17,-0.25,-19,-16,-0.25,-5],
// 3 0 -16 -0.25 -5 -17 -0.25 -19 -16 -0.25 -9
  [3,0,-16,-0.25,-5,-17,-0.25,-19,-16,-0.25,-9],
// 3 0 -16 -0.25 -9 -17 -0.25 -19 -16 -0.25 -11
  [3,0,-16,-0.25,-9,-17,-0.25,-19,-16,-0.25,-11],
// 3 0 -16 -0.25 -11 -17 -0.25 -19 -16 -0.25 -15
  [3,0,-16,-0.25,-11,-17,-0.25,-19,-16,-0.25,-15],
// 3 0 -16 -0.25 -15 -17 -0.25 -19 -16 -0.25 -19
  [3,0,-16,-0.25,-15,-17,-0.25,-19,-16,-0.25,-19],
// 3 0 -16 -0.25 -19 -17 -0.25 -19 -15 -0.25 -21
  [3,0,-16,-0.25,-19,-17,-0.25,-19,-15,-0.25,-21],
// 3 0 -12 -0.25 -19 -16 -0.25 -19 -15 -0.25 -21
  [3,0,-12,-0.25,-19,-16,-0.25,-19,-15,-0.25,-21],
// 3 0 -8 -0.25 -19 -12 -0.25 -19 -15 -0.25 -21
  [3,0,-8,-0.25,-19,-12,-0.25,-19,-15,-0.25,-21],
// 3 0 -6 -0.25 -19 -8 -0.25 -19 -15 -0.25 -21
  [3,0,-6,-0.25,-19,-8,-0.25,-19,-15,-0.25,-21],
// 3 0 -1 -0.25 -19 -6 -0.25 -19 -15 -0.25 -21
  [3,0,-1,-0.25,-19,-6,-0.25,-19,-15,-0.25,-21],
// 4 0 1 -0.25 -19 -1 -0.25 -19 -15 -0.25 -21 15 -0.25 -21
  [4,0,1,-0.25,-19,-1,-0.25,-19,-15,-0.25,-21,15,-0.25,-21],
// 3 0 6 -0.25 -19 1 -0.25 -19 15 -0.25 -21
  [3,0,6,-0.25,-19,1,-0.25,-19,15,-0.25,-21],
// 3 0 8 -0.25 -19 6 -0.25 -19 15 -0.25 -21
  [3,0,8,-0.25,-19,6,-0.25,-19,15,-0.25,-21],
// 3 0 12 -0.25 -19 8 -0.25 -19 15 -0.25 -21
  [3,0,12,-0.25,-19,8,-0.25,-19,15,-0.25,-21],
// 3 0 16 -0.25 -19 12 -0.25 -19 15 -0.25 -21
  [3,0,16,-0.25,-19,12,-0.25,-19,15,-0.25,-21],
// 3 0 17 -0.25 -19 16 -0.25 -19 15 -0.25 -21
  [3,0,17,-0.25,-19,16,-0.25,-19,15,-0.25,-21],
// 3 0 16 -0.25 -15 16 -0.25 -19 17 -0.25 -19
  [3,0,16,-0.25,-15,16,-0.25,-19,17,-0.25,-19],
// 3 0 16 -0.25 -11 16 -0.25 -15 17 -0.25 -19
  [3,0,16,-0.25,-11,16,-0.25,-15,17,-0.25,-19],
// 3 0 16 -0.25 -9 16 -0.25 -11 17 -0.25 -19
  [3,0,16,-0.25,-9,16,-0.25,-11,17,-0.25,-19],
// 3 0 16 -0.25 -5 16 -0.25 -9 17 -0.25 -19
  [3,0,16,-0.25,-5,16,-0.25,-9,17,-0.25,-19],
// 3 0 16 -0.25 -1 16 -0.25 -5 17 -0.25 -19
  [3,0,16,-0.25,-1,16,-0.25,-5,17,-0.25,-19],
// 4 0 16 -0.25 1 16 -0.25 -1 17 -0.25 -19 17 -0.25 19
  [4,0,16,-0.25,1,16,-0.25,-1,17,-0.25,-19,17,-0.25,19],
// 3 0 17 -0.25 19 16 -0.25 5 16 -0.25 1
  [3,0,17,-0.25,19,16,-0.25,5,16,-0.25,1],
// 3 0 17 -0.25 19 16 -0.25 9 16 -0.25 5
  [3,0,17,-0.25,19,16,-0.25,9,16,-0.25,5],
// 3 0 17 -0.25 19 16 -0.25 11 16 -0.25 9
  [3,0,17,-0.25,19,16,-0.25,11,16,-0.25,9],
// 3 0 17 -0.25 19 16 -0.25 15 16 -0.25 11
  [3,0,17,-0.25,19,16,-0.25,15,16,-0.25,11],
// 3 0 17 -0.25 19 16 -0.25 19 16 -0.25 15
  [3,0,17,-0.25,19,16,-0.25,19,16,-0.25,15],
// 3 0 15 -0.25 21 16 -0.25 19 17 -0.25 19
  [3,0,15,-0.25,21,16,-0.25,19,17,-0.25,19],
// 3 0 15 -0.25 21 12 -0.25 19 16 -0.25 19
  [3,0,15,-0.25,21,12,-0.25,19,16,-0.25,19],
// 3 0 15 -0.25 21 8 -0.25 19 12 -0.25 19
  [3,0,15,-0.25,21,8,-0.25,19,12,-0.25,19],
// 3 0 15 -0.25 21 6 -0.25 19 8 -0.25 19
  [3,0,15,-0.25,21,6,-0.25,19,8,-0.25,19],
// 3 0 15 -0.25 21 1 -0.25 19 6 -0.25 19
  [3,0,15,-0.25,21,1,-0.25,19,6,-0.25,19],
// 0 BFC CLIP
  [0,"BFC","CLIP"],
// 4 16 15 -0.25 21 19 -0.25 23 -19 -0.25 23 -15 -0.25 21
  [4,16,15,-0.25,21,19,-0.25,23,-19,-0.25,23,-15,-0.25,21],
// 3 16 -19 -0.25 23 -17 -0.25 21 -15 -0.25 21
  [3,16,-19,-0.25,23,-17,-0.25,21,-15,-0.25,21],
// 3 16 -19 -0.25 23 -17 -0.25 19 -17 -0.25 21
  [3,16,-19,-0.25,23,-17,-0.25,19,-17,-0.25,21],
// 4 16 -17 -0.25 -19 -17 -0.25 19 -19 -0.25 23 -19 -0.25 -23
  [4,16,-17,-0.25,-19,-17,-0.25,19,-19,-0.25,23,-19,-0.25,-23],
// 3 16 -17 -0.25 -19 -19 -0.25 -23 -17 -0.25 -21
  [3,16,-17,-0.25,-19,-19,-0.25,-23,-17,-0.25,-21],
// 3 16 -15 -0.25 -21 -17 -0.25 -21 -19 -0.25 -23
  [3,16,-15,-0.25,-21,-17,-0.25,-21,-19,-0.25,-23],
// 4 16 15 -0.25 -21 -15 -0.25 -21 -19 -0.25 -23 19 -0.25 -23
  [4,16,15,-0.25,-21,-15,-0.25,-21,-19,-0.25,-23,19,-0.25,-23],
// 3 16 17 -0.25 -21 15 -0.25 -21 19 -0.25 -23
  [3,16,17,-0.25,-21,15,-0.25,-21,19,-0.25,-23],
// 3 16 17 -0.25 -19 17 -0.25 -21 19 -0.25 -23
  [3,16,17,-0.25,-19,17,-0.25,-21,19,-0.25,-23],
// 4 16 17 -0.25 19 17 -0.25 -19 19 -0.25 -23 19 -0.25 23
  [4,16,17,-0.25,19,17,-0.25,-19,19,-0.25,-23,19,-0.25,23],
// 3 16 19 -0.25 23 17 -0.25 21 17 -0.25 19
  [3,16,19,-0.25,23,17,-0.25,21,17,-0.25,19],
// 3 16 19 -0.25 23 15 -0.25 21 17 -0.25 21
  [3,16,19,-0.25,23,15,-0.25,21,17,-0.25,21],
];
module ldraw_lib__196695b(step=0, col=false, unit=2/5, alt=false, line=0.2, solid=!$preview)
    makepoly(ldraw_lib__196695b(), step=step, col=col, unit=unit, alt=alt, line=line, solid=solid);
ldraw_lib__196695b(line=0.2);
